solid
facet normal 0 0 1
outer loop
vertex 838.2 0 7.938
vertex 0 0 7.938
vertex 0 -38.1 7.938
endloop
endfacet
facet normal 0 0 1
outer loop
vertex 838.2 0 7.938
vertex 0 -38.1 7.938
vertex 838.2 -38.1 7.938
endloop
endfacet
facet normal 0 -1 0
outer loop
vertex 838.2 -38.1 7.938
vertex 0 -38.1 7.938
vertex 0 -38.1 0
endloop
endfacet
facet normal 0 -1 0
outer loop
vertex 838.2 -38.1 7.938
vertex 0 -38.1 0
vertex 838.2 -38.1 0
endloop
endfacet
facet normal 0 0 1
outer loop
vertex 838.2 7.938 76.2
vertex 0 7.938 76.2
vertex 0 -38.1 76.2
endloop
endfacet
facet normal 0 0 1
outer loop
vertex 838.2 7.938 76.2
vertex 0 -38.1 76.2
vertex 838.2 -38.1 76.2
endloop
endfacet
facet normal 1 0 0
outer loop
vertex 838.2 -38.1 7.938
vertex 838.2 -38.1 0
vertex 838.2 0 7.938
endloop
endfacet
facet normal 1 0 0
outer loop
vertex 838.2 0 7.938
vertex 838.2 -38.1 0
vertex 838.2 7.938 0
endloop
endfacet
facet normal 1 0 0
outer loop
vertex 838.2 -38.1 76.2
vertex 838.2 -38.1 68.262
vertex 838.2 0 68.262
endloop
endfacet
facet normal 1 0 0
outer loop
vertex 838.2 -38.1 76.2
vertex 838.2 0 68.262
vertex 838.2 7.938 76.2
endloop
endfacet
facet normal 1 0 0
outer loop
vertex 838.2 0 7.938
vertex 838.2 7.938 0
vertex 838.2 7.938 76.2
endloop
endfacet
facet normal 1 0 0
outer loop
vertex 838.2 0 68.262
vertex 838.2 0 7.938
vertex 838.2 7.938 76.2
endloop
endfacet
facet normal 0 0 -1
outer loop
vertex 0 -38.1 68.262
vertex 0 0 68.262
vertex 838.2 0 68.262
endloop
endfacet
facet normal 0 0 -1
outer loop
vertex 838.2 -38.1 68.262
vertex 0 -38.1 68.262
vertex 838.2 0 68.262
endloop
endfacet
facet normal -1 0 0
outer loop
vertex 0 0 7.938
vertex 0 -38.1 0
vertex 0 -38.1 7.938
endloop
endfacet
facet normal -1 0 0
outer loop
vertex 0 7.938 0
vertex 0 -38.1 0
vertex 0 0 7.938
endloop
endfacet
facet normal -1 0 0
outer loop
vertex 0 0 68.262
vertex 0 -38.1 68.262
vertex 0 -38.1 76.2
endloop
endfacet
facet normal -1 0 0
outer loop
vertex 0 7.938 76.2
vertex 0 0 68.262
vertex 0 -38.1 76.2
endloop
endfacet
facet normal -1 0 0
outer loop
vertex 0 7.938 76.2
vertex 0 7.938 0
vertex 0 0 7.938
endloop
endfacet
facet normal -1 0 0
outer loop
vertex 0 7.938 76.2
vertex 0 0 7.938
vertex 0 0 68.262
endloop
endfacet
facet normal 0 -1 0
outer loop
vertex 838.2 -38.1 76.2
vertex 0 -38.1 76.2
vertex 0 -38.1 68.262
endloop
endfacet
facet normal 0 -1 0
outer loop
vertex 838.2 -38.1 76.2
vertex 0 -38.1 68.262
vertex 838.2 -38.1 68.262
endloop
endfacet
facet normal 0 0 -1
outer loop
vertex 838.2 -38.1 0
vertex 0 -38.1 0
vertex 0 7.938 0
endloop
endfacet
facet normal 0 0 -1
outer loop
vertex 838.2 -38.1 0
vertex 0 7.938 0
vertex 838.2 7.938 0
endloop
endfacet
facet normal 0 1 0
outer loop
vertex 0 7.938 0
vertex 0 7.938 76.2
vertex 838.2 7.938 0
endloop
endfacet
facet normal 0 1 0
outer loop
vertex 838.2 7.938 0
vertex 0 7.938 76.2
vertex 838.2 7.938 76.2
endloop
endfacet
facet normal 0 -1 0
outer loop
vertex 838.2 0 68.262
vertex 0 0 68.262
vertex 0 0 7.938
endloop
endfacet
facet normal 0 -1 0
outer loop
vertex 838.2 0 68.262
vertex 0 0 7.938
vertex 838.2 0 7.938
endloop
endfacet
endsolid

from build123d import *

# Parameters (mm, degrees)
F0_W     = 838.2
F0_H     = 76.2
F1_DEPTH = 7.9375
F2_W     = 838.2
F2_H     = 7.9375
F3_DEPTH = 38.1


with BuildPart() as f1:
    # F0 (on Front) → F1 (new body)
    with BuildSketch(Plane.XZ):
        with Locations((419.1, 38.1)):
            Rectangle(F0_W, F0_H)
    extrude(amount=-F1_DEPTH)

    # F2 (on Front) → F3 (join)
    with BuildSketch(Plane.XZ):
        with Locations((419.1, 72.23125)):
            Rectangle(F2_W, F2_H)
        with Locations((419.1, 3.96875)):
            Rectangle(F2_W, F2_H)
    extrude(amount=F3_DEPTH)


solid = f1.part
